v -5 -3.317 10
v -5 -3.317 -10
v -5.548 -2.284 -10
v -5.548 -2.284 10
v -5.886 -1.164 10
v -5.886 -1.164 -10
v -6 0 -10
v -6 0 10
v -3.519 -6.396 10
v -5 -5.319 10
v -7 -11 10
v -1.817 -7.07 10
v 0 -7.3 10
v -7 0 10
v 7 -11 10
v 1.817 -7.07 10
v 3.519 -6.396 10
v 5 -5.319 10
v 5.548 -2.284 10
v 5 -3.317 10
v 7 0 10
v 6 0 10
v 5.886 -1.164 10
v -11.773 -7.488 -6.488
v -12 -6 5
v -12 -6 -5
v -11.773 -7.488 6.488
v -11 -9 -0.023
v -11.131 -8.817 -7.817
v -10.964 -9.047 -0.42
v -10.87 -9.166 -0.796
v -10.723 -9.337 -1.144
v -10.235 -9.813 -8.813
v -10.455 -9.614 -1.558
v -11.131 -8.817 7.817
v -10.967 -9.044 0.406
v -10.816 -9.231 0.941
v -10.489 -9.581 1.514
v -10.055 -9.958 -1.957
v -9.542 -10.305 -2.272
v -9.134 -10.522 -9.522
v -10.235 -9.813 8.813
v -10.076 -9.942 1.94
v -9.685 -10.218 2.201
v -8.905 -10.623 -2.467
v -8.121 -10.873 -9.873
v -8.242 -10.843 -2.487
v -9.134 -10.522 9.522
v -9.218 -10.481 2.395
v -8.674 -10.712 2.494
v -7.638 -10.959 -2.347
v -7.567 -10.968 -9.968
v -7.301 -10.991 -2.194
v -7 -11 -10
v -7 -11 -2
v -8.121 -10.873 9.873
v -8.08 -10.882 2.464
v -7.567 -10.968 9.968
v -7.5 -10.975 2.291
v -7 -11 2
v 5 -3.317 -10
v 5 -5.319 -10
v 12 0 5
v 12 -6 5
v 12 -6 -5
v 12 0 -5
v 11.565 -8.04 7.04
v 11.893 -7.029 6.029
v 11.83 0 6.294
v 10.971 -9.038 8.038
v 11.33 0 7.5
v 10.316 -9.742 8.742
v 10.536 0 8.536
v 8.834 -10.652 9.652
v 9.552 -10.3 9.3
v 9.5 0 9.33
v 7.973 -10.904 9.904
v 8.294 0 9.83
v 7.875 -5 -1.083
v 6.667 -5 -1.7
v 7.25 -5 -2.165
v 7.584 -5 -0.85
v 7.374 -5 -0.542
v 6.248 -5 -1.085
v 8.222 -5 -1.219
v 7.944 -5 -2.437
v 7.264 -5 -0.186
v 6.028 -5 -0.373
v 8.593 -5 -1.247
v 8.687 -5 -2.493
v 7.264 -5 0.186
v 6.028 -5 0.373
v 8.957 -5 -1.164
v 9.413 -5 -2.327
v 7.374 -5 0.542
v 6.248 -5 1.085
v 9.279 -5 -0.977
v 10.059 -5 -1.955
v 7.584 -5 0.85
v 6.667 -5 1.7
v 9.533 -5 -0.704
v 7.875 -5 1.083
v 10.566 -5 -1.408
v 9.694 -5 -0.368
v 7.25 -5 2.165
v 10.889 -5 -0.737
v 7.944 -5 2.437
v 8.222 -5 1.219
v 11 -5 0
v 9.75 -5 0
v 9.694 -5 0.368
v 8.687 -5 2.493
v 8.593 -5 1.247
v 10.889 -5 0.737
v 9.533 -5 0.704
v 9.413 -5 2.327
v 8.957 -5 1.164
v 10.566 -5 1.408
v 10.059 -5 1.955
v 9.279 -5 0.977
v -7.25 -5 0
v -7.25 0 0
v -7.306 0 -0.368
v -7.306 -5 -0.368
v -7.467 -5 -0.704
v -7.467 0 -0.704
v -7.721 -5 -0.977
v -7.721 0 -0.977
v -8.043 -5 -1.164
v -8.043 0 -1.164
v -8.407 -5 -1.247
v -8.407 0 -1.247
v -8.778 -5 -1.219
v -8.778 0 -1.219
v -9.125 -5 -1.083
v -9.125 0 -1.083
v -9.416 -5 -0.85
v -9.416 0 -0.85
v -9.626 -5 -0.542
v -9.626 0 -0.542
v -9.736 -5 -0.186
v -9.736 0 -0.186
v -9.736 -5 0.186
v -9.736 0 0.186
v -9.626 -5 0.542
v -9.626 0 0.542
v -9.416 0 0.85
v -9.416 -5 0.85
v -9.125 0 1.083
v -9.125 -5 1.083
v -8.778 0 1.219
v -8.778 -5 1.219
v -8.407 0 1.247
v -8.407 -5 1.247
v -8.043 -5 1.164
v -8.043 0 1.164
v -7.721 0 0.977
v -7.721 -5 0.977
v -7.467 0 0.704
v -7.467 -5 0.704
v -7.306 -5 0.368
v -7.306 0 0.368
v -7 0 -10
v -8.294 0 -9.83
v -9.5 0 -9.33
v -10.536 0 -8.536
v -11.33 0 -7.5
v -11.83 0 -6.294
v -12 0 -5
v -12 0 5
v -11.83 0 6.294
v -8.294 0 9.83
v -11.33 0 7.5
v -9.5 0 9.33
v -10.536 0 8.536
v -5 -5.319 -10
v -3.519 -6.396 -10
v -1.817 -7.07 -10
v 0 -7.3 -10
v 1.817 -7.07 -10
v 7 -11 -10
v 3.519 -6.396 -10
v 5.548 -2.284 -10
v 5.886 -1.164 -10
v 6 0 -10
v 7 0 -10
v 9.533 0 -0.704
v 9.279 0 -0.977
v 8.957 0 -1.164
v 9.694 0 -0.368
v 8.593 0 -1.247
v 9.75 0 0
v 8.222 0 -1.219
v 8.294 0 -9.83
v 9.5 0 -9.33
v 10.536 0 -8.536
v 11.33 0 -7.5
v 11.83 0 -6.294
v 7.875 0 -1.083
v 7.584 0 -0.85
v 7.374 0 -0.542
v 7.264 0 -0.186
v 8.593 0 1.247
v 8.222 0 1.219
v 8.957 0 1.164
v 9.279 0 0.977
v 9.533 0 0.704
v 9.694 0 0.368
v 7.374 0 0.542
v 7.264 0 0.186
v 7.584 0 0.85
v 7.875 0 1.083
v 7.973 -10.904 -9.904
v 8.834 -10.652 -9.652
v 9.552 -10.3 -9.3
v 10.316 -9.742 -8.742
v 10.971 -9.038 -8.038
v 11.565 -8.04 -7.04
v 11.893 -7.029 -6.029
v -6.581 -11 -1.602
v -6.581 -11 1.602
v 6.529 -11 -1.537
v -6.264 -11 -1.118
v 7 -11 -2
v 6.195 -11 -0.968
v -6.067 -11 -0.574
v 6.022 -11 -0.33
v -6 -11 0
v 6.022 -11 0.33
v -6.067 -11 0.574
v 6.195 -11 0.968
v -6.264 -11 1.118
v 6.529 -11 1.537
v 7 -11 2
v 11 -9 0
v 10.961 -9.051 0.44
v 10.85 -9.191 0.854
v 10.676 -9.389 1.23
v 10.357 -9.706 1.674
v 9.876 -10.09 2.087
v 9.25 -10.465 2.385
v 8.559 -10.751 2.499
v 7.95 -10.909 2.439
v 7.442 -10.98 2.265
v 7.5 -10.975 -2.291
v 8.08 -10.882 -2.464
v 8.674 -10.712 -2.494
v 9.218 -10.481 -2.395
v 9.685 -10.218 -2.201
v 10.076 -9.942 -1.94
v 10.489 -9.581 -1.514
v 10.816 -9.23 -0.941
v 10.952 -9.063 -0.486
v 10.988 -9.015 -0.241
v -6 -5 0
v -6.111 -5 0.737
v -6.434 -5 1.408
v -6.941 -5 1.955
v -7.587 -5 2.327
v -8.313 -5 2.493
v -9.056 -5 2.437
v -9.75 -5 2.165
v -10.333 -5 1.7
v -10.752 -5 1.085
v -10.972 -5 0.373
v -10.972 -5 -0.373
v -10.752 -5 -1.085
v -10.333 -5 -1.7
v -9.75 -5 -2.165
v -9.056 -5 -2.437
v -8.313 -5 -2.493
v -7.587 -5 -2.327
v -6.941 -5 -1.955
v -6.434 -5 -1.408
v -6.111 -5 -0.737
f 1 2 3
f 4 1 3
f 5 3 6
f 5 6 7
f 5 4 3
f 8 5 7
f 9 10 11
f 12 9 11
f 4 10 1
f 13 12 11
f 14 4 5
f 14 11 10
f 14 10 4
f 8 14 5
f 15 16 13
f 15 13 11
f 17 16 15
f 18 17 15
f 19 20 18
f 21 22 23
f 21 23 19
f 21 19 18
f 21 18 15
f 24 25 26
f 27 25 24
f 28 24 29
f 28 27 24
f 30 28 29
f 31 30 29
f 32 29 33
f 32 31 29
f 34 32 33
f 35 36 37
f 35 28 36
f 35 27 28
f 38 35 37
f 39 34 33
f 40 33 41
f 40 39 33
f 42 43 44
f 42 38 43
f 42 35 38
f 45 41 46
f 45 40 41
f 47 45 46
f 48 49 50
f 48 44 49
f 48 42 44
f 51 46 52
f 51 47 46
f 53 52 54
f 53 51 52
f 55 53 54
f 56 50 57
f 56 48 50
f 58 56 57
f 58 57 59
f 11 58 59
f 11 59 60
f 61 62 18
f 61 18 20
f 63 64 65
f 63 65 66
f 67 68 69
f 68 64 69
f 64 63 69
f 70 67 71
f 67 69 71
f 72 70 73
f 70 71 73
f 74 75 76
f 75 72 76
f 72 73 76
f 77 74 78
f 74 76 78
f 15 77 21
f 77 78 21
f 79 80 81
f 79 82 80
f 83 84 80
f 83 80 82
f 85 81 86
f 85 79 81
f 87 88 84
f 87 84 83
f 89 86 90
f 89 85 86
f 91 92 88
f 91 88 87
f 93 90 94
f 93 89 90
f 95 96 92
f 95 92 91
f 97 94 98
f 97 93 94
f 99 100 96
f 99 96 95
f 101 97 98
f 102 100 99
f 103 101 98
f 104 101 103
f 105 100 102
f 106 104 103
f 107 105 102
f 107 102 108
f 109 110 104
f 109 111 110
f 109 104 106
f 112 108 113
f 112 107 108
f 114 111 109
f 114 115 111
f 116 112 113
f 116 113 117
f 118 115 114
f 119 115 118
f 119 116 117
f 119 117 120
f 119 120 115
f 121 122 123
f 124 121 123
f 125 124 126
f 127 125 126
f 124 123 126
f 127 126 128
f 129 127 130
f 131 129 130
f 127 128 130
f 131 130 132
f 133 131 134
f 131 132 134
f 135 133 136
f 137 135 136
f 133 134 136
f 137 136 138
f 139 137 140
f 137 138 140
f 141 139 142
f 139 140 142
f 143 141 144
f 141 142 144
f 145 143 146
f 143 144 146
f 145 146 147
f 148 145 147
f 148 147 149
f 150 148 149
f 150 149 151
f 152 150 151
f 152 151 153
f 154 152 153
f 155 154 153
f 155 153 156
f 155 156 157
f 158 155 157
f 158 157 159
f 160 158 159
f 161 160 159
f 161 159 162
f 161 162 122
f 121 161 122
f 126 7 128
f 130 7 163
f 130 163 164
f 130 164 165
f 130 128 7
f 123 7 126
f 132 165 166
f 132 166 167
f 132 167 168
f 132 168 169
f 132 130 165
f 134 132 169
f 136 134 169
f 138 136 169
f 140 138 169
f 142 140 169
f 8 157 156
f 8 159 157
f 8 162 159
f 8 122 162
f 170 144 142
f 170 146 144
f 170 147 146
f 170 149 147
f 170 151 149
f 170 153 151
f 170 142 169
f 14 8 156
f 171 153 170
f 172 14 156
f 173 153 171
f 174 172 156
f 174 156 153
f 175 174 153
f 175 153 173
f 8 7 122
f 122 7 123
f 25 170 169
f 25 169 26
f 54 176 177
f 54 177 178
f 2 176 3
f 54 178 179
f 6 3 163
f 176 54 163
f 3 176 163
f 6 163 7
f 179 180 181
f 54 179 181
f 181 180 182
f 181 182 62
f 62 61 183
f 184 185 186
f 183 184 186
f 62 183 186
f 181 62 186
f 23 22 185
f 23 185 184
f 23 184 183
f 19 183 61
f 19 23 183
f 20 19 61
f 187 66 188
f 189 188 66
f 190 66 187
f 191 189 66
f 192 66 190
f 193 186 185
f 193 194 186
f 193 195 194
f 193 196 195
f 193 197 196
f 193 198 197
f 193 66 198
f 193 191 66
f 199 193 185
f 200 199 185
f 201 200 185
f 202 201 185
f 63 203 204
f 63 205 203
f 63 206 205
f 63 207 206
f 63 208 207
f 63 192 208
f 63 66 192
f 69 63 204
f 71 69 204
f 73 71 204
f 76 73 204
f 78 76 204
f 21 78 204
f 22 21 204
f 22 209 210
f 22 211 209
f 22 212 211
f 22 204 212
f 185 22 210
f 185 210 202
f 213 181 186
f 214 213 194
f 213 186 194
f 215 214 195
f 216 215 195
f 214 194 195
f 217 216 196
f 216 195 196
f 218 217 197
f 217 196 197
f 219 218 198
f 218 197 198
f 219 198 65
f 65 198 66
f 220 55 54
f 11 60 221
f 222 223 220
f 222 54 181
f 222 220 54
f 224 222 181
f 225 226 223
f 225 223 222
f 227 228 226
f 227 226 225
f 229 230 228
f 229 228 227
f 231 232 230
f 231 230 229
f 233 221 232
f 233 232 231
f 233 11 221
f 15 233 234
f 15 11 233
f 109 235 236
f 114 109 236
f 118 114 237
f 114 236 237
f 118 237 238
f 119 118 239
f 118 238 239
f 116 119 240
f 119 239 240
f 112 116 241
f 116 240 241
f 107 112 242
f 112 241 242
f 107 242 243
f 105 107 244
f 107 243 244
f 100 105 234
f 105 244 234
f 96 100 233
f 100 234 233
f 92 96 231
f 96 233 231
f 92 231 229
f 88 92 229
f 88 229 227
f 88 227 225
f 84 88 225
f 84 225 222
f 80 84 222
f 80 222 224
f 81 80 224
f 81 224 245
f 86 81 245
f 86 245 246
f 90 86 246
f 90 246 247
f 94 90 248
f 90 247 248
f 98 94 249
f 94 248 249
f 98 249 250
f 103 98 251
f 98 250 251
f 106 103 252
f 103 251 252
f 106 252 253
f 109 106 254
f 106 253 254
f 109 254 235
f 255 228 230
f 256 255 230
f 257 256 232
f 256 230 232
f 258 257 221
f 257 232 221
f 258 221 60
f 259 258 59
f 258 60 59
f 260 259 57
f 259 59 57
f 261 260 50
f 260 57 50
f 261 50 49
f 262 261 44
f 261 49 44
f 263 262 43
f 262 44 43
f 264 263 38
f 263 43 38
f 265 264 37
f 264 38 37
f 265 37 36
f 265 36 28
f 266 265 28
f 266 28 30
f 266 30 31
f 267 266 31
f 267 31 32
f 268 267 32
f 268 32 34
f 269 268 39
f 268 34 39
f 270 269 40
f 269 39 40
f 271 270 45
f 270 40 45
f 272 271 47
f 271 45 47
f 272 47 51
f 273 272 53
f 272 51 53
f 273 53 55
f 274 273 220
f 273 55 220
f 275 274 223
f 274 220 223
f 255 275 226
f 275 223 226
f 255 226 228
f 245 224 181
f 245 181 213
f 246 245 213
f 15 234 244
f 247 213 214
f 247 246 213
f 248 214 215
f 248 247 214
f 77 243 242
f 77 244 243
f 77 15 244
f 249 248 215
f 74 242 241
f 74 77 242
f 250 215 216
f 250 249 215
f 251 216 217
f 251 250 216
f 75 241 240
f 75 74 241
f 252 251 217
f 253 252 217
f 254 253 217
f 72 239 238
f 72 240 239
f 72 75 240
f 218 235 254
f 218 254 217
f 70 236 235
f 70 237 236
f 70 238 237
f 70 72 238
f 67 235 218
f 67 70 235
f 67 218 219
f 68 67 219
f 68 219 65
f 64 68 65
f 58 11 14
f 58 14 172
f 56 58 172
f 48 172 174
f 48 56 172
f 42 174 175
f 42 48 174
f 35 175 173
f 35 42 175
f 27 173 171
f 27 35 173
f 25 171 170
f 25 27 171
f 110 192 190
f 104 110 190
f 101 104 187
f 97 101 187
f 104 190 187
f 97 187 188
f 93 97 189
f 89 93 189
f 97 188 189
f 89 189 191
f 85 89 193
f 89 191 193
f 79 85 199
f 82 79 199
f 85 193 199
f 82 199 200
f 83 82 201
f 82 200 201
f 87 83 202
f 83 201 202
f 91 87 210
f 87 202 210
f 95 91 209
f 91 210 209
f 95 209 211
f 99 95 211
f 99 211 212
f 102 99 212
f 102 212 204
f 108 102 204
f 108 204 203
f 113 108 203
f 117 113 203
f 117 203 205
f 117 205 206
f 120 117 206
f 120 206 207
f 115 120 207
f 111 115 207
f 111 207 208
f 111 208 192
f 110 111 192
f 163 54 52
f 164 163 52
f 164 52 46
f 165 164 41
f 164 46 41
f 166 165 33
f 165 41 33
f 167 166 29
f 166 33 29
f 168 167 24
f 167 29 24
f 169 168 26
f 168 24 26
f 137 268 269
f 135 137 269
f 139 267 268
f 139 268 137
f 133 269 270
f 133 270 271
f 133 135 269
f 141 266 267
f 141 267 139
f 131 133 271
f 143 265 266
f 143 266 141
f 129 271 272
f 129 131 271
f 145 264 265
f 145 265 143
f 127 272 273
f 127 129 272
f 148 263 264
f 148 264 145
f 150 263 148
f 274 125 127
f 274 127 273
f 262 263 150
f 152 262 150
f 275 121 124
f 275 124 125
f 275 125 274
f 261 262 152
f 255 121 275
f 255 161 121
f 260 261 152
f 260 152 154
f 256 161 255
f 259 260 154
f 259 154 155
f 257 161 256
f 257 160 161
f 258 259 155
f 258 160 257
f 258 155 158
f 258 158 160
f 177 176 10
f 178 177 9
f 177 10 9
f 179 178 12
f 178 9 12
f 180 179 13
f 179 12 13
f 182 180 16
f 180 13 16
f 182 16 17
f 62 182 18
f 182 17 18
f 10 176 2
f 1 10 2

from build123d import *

# Parameters (mm, degrees)
BOSS_EXTRUDE1_DEPTH     = 10
SKETCH2_W               = 10
SKETCH2_H               = 5.318834459
CUT_EXTRUDE1_DEPTH      = 11
CUT_EXTRUDE1_DEPTH_BACK = 11
SKETCH3_R               = 1.25
CUT_EXTRUDE2_DEPTH      = 17
FILLET1_R               = 5
CUT_EXTRUDE3_DEPTH      = 11
CUT_EXTRUDE3_DEPTH_BACK = 11
SKETCH5_R               = 2.5
CUT_EXTRUDE4_DEPTH      = 6


with BuildPart() as part:
    # Sketch1 → Boss-Extrude1 (new body, symmetric)
    with BuildSketch(Plane.XY):
        with BuildLine():
            Line((12, 0), (6, 0))
            ThreePointArc((6, 0), (0, -6), (-6, 0))
            Line((-6, 0), (-12, 0))
            Line((-12, 0), (-12, -11))
            Line((-12, -11), (12, -11))
            Line((12, -11), (12, 0))
        make_face()
    extrude(amount=BOSS_EXTRUDE1_DEPTH, both=True)

    # Sketch2 → Cut-Extrude1 (cut, two sides)
    with BuildSketch(Plane.XY) as cut_extrude1_sk:
        with BuildLine():
            Line((5, -5.318834459), (-5, -5.318834459))
            ThreePointArc((-5, -5.318834459), (0, -7.3), (5, -5.318834459))
        make_face()
        with Locations((0, -2.65941723)):
            Rectangle(SKETCH2_W, SKETCH2_H)
    extrude(amount=CUT_EXTRUDE1_DEPTH, mode=Mode.SUBTRACT)
    extrude(cut_extrude1_sk.sketch, amount=-CUT_EXTRUDE1_DEPTH_BACK, mode=Mode.SUBTRACT)

    # Sketch3 → Cut-Extrude2 (cut)
    with BuildSketch(Plane(origin=(0, 0, 0), x_dir=(1, 0, 0), z_dir=(0, 1, 0))):
        with Locations((-8.5, 0)):
            Circle(SKETCH3_R)
        with Locations((8.5, 0)):
            Circle(SKETCH3_R)
    extrude(amount=-CUT_EXTRUDE2_DEPTH, mode=Mode.SUBTRACT)

    # Fillet1
    fillet1_edges = [part.edges().sort_by_distance(p)[0] for p in [
        (12, -5.5, 10),
        (-12, -5.5, 10),
        (-12, -5.5, -10),
        (12, -5.5, -10),
    ]]
    fillet(fillet1_edges, radius=FILLET1_R)

    # Sketch4 → Cut-Extrude3 (cut, two sides)
    with BuildSketch(Plane.XY) as cut_extrude3_sk:
        with BuildLine():
            ThreePointArc((7, -11), (10.535533906, -9.535533906), (12, -6))
            Line((12, -6), (12, -11))
            Line((12, -11), (7, -11))
        make_face()
        with BuildLine():
            ThreePointArc((-12, -6), (-10.535533906, -9.535533906), (-7, -11))
            Line((-7, -11), (-12, -11))
            Line((-12, -11), (-12, -6))
        make_face()
    extrude(amount=CUT_EXTRUDE3_DEPTH, mode=Mode.SUBTRACT)
    extrude(cut_extrude3_sk.sketch, amount=-CUT_EXTRUDE3_DEPTH_BACK, mode=Mode.SUBTRACT)

    # Sketch5 → Cut-Extrude4 (cut)
    with BuildSketch(Plane.XZ.offset(11)):
        with Locations((-8.5, 0)):
            Circle(SKETCH5_R)
        with Locations((8.5, 0)):
            Circle(SKETCH5_R)
    extrude(amount=-CUT_EXTRUDE4_DEPTH, mode=Mode.SUBTRACT)


solid = part.part
